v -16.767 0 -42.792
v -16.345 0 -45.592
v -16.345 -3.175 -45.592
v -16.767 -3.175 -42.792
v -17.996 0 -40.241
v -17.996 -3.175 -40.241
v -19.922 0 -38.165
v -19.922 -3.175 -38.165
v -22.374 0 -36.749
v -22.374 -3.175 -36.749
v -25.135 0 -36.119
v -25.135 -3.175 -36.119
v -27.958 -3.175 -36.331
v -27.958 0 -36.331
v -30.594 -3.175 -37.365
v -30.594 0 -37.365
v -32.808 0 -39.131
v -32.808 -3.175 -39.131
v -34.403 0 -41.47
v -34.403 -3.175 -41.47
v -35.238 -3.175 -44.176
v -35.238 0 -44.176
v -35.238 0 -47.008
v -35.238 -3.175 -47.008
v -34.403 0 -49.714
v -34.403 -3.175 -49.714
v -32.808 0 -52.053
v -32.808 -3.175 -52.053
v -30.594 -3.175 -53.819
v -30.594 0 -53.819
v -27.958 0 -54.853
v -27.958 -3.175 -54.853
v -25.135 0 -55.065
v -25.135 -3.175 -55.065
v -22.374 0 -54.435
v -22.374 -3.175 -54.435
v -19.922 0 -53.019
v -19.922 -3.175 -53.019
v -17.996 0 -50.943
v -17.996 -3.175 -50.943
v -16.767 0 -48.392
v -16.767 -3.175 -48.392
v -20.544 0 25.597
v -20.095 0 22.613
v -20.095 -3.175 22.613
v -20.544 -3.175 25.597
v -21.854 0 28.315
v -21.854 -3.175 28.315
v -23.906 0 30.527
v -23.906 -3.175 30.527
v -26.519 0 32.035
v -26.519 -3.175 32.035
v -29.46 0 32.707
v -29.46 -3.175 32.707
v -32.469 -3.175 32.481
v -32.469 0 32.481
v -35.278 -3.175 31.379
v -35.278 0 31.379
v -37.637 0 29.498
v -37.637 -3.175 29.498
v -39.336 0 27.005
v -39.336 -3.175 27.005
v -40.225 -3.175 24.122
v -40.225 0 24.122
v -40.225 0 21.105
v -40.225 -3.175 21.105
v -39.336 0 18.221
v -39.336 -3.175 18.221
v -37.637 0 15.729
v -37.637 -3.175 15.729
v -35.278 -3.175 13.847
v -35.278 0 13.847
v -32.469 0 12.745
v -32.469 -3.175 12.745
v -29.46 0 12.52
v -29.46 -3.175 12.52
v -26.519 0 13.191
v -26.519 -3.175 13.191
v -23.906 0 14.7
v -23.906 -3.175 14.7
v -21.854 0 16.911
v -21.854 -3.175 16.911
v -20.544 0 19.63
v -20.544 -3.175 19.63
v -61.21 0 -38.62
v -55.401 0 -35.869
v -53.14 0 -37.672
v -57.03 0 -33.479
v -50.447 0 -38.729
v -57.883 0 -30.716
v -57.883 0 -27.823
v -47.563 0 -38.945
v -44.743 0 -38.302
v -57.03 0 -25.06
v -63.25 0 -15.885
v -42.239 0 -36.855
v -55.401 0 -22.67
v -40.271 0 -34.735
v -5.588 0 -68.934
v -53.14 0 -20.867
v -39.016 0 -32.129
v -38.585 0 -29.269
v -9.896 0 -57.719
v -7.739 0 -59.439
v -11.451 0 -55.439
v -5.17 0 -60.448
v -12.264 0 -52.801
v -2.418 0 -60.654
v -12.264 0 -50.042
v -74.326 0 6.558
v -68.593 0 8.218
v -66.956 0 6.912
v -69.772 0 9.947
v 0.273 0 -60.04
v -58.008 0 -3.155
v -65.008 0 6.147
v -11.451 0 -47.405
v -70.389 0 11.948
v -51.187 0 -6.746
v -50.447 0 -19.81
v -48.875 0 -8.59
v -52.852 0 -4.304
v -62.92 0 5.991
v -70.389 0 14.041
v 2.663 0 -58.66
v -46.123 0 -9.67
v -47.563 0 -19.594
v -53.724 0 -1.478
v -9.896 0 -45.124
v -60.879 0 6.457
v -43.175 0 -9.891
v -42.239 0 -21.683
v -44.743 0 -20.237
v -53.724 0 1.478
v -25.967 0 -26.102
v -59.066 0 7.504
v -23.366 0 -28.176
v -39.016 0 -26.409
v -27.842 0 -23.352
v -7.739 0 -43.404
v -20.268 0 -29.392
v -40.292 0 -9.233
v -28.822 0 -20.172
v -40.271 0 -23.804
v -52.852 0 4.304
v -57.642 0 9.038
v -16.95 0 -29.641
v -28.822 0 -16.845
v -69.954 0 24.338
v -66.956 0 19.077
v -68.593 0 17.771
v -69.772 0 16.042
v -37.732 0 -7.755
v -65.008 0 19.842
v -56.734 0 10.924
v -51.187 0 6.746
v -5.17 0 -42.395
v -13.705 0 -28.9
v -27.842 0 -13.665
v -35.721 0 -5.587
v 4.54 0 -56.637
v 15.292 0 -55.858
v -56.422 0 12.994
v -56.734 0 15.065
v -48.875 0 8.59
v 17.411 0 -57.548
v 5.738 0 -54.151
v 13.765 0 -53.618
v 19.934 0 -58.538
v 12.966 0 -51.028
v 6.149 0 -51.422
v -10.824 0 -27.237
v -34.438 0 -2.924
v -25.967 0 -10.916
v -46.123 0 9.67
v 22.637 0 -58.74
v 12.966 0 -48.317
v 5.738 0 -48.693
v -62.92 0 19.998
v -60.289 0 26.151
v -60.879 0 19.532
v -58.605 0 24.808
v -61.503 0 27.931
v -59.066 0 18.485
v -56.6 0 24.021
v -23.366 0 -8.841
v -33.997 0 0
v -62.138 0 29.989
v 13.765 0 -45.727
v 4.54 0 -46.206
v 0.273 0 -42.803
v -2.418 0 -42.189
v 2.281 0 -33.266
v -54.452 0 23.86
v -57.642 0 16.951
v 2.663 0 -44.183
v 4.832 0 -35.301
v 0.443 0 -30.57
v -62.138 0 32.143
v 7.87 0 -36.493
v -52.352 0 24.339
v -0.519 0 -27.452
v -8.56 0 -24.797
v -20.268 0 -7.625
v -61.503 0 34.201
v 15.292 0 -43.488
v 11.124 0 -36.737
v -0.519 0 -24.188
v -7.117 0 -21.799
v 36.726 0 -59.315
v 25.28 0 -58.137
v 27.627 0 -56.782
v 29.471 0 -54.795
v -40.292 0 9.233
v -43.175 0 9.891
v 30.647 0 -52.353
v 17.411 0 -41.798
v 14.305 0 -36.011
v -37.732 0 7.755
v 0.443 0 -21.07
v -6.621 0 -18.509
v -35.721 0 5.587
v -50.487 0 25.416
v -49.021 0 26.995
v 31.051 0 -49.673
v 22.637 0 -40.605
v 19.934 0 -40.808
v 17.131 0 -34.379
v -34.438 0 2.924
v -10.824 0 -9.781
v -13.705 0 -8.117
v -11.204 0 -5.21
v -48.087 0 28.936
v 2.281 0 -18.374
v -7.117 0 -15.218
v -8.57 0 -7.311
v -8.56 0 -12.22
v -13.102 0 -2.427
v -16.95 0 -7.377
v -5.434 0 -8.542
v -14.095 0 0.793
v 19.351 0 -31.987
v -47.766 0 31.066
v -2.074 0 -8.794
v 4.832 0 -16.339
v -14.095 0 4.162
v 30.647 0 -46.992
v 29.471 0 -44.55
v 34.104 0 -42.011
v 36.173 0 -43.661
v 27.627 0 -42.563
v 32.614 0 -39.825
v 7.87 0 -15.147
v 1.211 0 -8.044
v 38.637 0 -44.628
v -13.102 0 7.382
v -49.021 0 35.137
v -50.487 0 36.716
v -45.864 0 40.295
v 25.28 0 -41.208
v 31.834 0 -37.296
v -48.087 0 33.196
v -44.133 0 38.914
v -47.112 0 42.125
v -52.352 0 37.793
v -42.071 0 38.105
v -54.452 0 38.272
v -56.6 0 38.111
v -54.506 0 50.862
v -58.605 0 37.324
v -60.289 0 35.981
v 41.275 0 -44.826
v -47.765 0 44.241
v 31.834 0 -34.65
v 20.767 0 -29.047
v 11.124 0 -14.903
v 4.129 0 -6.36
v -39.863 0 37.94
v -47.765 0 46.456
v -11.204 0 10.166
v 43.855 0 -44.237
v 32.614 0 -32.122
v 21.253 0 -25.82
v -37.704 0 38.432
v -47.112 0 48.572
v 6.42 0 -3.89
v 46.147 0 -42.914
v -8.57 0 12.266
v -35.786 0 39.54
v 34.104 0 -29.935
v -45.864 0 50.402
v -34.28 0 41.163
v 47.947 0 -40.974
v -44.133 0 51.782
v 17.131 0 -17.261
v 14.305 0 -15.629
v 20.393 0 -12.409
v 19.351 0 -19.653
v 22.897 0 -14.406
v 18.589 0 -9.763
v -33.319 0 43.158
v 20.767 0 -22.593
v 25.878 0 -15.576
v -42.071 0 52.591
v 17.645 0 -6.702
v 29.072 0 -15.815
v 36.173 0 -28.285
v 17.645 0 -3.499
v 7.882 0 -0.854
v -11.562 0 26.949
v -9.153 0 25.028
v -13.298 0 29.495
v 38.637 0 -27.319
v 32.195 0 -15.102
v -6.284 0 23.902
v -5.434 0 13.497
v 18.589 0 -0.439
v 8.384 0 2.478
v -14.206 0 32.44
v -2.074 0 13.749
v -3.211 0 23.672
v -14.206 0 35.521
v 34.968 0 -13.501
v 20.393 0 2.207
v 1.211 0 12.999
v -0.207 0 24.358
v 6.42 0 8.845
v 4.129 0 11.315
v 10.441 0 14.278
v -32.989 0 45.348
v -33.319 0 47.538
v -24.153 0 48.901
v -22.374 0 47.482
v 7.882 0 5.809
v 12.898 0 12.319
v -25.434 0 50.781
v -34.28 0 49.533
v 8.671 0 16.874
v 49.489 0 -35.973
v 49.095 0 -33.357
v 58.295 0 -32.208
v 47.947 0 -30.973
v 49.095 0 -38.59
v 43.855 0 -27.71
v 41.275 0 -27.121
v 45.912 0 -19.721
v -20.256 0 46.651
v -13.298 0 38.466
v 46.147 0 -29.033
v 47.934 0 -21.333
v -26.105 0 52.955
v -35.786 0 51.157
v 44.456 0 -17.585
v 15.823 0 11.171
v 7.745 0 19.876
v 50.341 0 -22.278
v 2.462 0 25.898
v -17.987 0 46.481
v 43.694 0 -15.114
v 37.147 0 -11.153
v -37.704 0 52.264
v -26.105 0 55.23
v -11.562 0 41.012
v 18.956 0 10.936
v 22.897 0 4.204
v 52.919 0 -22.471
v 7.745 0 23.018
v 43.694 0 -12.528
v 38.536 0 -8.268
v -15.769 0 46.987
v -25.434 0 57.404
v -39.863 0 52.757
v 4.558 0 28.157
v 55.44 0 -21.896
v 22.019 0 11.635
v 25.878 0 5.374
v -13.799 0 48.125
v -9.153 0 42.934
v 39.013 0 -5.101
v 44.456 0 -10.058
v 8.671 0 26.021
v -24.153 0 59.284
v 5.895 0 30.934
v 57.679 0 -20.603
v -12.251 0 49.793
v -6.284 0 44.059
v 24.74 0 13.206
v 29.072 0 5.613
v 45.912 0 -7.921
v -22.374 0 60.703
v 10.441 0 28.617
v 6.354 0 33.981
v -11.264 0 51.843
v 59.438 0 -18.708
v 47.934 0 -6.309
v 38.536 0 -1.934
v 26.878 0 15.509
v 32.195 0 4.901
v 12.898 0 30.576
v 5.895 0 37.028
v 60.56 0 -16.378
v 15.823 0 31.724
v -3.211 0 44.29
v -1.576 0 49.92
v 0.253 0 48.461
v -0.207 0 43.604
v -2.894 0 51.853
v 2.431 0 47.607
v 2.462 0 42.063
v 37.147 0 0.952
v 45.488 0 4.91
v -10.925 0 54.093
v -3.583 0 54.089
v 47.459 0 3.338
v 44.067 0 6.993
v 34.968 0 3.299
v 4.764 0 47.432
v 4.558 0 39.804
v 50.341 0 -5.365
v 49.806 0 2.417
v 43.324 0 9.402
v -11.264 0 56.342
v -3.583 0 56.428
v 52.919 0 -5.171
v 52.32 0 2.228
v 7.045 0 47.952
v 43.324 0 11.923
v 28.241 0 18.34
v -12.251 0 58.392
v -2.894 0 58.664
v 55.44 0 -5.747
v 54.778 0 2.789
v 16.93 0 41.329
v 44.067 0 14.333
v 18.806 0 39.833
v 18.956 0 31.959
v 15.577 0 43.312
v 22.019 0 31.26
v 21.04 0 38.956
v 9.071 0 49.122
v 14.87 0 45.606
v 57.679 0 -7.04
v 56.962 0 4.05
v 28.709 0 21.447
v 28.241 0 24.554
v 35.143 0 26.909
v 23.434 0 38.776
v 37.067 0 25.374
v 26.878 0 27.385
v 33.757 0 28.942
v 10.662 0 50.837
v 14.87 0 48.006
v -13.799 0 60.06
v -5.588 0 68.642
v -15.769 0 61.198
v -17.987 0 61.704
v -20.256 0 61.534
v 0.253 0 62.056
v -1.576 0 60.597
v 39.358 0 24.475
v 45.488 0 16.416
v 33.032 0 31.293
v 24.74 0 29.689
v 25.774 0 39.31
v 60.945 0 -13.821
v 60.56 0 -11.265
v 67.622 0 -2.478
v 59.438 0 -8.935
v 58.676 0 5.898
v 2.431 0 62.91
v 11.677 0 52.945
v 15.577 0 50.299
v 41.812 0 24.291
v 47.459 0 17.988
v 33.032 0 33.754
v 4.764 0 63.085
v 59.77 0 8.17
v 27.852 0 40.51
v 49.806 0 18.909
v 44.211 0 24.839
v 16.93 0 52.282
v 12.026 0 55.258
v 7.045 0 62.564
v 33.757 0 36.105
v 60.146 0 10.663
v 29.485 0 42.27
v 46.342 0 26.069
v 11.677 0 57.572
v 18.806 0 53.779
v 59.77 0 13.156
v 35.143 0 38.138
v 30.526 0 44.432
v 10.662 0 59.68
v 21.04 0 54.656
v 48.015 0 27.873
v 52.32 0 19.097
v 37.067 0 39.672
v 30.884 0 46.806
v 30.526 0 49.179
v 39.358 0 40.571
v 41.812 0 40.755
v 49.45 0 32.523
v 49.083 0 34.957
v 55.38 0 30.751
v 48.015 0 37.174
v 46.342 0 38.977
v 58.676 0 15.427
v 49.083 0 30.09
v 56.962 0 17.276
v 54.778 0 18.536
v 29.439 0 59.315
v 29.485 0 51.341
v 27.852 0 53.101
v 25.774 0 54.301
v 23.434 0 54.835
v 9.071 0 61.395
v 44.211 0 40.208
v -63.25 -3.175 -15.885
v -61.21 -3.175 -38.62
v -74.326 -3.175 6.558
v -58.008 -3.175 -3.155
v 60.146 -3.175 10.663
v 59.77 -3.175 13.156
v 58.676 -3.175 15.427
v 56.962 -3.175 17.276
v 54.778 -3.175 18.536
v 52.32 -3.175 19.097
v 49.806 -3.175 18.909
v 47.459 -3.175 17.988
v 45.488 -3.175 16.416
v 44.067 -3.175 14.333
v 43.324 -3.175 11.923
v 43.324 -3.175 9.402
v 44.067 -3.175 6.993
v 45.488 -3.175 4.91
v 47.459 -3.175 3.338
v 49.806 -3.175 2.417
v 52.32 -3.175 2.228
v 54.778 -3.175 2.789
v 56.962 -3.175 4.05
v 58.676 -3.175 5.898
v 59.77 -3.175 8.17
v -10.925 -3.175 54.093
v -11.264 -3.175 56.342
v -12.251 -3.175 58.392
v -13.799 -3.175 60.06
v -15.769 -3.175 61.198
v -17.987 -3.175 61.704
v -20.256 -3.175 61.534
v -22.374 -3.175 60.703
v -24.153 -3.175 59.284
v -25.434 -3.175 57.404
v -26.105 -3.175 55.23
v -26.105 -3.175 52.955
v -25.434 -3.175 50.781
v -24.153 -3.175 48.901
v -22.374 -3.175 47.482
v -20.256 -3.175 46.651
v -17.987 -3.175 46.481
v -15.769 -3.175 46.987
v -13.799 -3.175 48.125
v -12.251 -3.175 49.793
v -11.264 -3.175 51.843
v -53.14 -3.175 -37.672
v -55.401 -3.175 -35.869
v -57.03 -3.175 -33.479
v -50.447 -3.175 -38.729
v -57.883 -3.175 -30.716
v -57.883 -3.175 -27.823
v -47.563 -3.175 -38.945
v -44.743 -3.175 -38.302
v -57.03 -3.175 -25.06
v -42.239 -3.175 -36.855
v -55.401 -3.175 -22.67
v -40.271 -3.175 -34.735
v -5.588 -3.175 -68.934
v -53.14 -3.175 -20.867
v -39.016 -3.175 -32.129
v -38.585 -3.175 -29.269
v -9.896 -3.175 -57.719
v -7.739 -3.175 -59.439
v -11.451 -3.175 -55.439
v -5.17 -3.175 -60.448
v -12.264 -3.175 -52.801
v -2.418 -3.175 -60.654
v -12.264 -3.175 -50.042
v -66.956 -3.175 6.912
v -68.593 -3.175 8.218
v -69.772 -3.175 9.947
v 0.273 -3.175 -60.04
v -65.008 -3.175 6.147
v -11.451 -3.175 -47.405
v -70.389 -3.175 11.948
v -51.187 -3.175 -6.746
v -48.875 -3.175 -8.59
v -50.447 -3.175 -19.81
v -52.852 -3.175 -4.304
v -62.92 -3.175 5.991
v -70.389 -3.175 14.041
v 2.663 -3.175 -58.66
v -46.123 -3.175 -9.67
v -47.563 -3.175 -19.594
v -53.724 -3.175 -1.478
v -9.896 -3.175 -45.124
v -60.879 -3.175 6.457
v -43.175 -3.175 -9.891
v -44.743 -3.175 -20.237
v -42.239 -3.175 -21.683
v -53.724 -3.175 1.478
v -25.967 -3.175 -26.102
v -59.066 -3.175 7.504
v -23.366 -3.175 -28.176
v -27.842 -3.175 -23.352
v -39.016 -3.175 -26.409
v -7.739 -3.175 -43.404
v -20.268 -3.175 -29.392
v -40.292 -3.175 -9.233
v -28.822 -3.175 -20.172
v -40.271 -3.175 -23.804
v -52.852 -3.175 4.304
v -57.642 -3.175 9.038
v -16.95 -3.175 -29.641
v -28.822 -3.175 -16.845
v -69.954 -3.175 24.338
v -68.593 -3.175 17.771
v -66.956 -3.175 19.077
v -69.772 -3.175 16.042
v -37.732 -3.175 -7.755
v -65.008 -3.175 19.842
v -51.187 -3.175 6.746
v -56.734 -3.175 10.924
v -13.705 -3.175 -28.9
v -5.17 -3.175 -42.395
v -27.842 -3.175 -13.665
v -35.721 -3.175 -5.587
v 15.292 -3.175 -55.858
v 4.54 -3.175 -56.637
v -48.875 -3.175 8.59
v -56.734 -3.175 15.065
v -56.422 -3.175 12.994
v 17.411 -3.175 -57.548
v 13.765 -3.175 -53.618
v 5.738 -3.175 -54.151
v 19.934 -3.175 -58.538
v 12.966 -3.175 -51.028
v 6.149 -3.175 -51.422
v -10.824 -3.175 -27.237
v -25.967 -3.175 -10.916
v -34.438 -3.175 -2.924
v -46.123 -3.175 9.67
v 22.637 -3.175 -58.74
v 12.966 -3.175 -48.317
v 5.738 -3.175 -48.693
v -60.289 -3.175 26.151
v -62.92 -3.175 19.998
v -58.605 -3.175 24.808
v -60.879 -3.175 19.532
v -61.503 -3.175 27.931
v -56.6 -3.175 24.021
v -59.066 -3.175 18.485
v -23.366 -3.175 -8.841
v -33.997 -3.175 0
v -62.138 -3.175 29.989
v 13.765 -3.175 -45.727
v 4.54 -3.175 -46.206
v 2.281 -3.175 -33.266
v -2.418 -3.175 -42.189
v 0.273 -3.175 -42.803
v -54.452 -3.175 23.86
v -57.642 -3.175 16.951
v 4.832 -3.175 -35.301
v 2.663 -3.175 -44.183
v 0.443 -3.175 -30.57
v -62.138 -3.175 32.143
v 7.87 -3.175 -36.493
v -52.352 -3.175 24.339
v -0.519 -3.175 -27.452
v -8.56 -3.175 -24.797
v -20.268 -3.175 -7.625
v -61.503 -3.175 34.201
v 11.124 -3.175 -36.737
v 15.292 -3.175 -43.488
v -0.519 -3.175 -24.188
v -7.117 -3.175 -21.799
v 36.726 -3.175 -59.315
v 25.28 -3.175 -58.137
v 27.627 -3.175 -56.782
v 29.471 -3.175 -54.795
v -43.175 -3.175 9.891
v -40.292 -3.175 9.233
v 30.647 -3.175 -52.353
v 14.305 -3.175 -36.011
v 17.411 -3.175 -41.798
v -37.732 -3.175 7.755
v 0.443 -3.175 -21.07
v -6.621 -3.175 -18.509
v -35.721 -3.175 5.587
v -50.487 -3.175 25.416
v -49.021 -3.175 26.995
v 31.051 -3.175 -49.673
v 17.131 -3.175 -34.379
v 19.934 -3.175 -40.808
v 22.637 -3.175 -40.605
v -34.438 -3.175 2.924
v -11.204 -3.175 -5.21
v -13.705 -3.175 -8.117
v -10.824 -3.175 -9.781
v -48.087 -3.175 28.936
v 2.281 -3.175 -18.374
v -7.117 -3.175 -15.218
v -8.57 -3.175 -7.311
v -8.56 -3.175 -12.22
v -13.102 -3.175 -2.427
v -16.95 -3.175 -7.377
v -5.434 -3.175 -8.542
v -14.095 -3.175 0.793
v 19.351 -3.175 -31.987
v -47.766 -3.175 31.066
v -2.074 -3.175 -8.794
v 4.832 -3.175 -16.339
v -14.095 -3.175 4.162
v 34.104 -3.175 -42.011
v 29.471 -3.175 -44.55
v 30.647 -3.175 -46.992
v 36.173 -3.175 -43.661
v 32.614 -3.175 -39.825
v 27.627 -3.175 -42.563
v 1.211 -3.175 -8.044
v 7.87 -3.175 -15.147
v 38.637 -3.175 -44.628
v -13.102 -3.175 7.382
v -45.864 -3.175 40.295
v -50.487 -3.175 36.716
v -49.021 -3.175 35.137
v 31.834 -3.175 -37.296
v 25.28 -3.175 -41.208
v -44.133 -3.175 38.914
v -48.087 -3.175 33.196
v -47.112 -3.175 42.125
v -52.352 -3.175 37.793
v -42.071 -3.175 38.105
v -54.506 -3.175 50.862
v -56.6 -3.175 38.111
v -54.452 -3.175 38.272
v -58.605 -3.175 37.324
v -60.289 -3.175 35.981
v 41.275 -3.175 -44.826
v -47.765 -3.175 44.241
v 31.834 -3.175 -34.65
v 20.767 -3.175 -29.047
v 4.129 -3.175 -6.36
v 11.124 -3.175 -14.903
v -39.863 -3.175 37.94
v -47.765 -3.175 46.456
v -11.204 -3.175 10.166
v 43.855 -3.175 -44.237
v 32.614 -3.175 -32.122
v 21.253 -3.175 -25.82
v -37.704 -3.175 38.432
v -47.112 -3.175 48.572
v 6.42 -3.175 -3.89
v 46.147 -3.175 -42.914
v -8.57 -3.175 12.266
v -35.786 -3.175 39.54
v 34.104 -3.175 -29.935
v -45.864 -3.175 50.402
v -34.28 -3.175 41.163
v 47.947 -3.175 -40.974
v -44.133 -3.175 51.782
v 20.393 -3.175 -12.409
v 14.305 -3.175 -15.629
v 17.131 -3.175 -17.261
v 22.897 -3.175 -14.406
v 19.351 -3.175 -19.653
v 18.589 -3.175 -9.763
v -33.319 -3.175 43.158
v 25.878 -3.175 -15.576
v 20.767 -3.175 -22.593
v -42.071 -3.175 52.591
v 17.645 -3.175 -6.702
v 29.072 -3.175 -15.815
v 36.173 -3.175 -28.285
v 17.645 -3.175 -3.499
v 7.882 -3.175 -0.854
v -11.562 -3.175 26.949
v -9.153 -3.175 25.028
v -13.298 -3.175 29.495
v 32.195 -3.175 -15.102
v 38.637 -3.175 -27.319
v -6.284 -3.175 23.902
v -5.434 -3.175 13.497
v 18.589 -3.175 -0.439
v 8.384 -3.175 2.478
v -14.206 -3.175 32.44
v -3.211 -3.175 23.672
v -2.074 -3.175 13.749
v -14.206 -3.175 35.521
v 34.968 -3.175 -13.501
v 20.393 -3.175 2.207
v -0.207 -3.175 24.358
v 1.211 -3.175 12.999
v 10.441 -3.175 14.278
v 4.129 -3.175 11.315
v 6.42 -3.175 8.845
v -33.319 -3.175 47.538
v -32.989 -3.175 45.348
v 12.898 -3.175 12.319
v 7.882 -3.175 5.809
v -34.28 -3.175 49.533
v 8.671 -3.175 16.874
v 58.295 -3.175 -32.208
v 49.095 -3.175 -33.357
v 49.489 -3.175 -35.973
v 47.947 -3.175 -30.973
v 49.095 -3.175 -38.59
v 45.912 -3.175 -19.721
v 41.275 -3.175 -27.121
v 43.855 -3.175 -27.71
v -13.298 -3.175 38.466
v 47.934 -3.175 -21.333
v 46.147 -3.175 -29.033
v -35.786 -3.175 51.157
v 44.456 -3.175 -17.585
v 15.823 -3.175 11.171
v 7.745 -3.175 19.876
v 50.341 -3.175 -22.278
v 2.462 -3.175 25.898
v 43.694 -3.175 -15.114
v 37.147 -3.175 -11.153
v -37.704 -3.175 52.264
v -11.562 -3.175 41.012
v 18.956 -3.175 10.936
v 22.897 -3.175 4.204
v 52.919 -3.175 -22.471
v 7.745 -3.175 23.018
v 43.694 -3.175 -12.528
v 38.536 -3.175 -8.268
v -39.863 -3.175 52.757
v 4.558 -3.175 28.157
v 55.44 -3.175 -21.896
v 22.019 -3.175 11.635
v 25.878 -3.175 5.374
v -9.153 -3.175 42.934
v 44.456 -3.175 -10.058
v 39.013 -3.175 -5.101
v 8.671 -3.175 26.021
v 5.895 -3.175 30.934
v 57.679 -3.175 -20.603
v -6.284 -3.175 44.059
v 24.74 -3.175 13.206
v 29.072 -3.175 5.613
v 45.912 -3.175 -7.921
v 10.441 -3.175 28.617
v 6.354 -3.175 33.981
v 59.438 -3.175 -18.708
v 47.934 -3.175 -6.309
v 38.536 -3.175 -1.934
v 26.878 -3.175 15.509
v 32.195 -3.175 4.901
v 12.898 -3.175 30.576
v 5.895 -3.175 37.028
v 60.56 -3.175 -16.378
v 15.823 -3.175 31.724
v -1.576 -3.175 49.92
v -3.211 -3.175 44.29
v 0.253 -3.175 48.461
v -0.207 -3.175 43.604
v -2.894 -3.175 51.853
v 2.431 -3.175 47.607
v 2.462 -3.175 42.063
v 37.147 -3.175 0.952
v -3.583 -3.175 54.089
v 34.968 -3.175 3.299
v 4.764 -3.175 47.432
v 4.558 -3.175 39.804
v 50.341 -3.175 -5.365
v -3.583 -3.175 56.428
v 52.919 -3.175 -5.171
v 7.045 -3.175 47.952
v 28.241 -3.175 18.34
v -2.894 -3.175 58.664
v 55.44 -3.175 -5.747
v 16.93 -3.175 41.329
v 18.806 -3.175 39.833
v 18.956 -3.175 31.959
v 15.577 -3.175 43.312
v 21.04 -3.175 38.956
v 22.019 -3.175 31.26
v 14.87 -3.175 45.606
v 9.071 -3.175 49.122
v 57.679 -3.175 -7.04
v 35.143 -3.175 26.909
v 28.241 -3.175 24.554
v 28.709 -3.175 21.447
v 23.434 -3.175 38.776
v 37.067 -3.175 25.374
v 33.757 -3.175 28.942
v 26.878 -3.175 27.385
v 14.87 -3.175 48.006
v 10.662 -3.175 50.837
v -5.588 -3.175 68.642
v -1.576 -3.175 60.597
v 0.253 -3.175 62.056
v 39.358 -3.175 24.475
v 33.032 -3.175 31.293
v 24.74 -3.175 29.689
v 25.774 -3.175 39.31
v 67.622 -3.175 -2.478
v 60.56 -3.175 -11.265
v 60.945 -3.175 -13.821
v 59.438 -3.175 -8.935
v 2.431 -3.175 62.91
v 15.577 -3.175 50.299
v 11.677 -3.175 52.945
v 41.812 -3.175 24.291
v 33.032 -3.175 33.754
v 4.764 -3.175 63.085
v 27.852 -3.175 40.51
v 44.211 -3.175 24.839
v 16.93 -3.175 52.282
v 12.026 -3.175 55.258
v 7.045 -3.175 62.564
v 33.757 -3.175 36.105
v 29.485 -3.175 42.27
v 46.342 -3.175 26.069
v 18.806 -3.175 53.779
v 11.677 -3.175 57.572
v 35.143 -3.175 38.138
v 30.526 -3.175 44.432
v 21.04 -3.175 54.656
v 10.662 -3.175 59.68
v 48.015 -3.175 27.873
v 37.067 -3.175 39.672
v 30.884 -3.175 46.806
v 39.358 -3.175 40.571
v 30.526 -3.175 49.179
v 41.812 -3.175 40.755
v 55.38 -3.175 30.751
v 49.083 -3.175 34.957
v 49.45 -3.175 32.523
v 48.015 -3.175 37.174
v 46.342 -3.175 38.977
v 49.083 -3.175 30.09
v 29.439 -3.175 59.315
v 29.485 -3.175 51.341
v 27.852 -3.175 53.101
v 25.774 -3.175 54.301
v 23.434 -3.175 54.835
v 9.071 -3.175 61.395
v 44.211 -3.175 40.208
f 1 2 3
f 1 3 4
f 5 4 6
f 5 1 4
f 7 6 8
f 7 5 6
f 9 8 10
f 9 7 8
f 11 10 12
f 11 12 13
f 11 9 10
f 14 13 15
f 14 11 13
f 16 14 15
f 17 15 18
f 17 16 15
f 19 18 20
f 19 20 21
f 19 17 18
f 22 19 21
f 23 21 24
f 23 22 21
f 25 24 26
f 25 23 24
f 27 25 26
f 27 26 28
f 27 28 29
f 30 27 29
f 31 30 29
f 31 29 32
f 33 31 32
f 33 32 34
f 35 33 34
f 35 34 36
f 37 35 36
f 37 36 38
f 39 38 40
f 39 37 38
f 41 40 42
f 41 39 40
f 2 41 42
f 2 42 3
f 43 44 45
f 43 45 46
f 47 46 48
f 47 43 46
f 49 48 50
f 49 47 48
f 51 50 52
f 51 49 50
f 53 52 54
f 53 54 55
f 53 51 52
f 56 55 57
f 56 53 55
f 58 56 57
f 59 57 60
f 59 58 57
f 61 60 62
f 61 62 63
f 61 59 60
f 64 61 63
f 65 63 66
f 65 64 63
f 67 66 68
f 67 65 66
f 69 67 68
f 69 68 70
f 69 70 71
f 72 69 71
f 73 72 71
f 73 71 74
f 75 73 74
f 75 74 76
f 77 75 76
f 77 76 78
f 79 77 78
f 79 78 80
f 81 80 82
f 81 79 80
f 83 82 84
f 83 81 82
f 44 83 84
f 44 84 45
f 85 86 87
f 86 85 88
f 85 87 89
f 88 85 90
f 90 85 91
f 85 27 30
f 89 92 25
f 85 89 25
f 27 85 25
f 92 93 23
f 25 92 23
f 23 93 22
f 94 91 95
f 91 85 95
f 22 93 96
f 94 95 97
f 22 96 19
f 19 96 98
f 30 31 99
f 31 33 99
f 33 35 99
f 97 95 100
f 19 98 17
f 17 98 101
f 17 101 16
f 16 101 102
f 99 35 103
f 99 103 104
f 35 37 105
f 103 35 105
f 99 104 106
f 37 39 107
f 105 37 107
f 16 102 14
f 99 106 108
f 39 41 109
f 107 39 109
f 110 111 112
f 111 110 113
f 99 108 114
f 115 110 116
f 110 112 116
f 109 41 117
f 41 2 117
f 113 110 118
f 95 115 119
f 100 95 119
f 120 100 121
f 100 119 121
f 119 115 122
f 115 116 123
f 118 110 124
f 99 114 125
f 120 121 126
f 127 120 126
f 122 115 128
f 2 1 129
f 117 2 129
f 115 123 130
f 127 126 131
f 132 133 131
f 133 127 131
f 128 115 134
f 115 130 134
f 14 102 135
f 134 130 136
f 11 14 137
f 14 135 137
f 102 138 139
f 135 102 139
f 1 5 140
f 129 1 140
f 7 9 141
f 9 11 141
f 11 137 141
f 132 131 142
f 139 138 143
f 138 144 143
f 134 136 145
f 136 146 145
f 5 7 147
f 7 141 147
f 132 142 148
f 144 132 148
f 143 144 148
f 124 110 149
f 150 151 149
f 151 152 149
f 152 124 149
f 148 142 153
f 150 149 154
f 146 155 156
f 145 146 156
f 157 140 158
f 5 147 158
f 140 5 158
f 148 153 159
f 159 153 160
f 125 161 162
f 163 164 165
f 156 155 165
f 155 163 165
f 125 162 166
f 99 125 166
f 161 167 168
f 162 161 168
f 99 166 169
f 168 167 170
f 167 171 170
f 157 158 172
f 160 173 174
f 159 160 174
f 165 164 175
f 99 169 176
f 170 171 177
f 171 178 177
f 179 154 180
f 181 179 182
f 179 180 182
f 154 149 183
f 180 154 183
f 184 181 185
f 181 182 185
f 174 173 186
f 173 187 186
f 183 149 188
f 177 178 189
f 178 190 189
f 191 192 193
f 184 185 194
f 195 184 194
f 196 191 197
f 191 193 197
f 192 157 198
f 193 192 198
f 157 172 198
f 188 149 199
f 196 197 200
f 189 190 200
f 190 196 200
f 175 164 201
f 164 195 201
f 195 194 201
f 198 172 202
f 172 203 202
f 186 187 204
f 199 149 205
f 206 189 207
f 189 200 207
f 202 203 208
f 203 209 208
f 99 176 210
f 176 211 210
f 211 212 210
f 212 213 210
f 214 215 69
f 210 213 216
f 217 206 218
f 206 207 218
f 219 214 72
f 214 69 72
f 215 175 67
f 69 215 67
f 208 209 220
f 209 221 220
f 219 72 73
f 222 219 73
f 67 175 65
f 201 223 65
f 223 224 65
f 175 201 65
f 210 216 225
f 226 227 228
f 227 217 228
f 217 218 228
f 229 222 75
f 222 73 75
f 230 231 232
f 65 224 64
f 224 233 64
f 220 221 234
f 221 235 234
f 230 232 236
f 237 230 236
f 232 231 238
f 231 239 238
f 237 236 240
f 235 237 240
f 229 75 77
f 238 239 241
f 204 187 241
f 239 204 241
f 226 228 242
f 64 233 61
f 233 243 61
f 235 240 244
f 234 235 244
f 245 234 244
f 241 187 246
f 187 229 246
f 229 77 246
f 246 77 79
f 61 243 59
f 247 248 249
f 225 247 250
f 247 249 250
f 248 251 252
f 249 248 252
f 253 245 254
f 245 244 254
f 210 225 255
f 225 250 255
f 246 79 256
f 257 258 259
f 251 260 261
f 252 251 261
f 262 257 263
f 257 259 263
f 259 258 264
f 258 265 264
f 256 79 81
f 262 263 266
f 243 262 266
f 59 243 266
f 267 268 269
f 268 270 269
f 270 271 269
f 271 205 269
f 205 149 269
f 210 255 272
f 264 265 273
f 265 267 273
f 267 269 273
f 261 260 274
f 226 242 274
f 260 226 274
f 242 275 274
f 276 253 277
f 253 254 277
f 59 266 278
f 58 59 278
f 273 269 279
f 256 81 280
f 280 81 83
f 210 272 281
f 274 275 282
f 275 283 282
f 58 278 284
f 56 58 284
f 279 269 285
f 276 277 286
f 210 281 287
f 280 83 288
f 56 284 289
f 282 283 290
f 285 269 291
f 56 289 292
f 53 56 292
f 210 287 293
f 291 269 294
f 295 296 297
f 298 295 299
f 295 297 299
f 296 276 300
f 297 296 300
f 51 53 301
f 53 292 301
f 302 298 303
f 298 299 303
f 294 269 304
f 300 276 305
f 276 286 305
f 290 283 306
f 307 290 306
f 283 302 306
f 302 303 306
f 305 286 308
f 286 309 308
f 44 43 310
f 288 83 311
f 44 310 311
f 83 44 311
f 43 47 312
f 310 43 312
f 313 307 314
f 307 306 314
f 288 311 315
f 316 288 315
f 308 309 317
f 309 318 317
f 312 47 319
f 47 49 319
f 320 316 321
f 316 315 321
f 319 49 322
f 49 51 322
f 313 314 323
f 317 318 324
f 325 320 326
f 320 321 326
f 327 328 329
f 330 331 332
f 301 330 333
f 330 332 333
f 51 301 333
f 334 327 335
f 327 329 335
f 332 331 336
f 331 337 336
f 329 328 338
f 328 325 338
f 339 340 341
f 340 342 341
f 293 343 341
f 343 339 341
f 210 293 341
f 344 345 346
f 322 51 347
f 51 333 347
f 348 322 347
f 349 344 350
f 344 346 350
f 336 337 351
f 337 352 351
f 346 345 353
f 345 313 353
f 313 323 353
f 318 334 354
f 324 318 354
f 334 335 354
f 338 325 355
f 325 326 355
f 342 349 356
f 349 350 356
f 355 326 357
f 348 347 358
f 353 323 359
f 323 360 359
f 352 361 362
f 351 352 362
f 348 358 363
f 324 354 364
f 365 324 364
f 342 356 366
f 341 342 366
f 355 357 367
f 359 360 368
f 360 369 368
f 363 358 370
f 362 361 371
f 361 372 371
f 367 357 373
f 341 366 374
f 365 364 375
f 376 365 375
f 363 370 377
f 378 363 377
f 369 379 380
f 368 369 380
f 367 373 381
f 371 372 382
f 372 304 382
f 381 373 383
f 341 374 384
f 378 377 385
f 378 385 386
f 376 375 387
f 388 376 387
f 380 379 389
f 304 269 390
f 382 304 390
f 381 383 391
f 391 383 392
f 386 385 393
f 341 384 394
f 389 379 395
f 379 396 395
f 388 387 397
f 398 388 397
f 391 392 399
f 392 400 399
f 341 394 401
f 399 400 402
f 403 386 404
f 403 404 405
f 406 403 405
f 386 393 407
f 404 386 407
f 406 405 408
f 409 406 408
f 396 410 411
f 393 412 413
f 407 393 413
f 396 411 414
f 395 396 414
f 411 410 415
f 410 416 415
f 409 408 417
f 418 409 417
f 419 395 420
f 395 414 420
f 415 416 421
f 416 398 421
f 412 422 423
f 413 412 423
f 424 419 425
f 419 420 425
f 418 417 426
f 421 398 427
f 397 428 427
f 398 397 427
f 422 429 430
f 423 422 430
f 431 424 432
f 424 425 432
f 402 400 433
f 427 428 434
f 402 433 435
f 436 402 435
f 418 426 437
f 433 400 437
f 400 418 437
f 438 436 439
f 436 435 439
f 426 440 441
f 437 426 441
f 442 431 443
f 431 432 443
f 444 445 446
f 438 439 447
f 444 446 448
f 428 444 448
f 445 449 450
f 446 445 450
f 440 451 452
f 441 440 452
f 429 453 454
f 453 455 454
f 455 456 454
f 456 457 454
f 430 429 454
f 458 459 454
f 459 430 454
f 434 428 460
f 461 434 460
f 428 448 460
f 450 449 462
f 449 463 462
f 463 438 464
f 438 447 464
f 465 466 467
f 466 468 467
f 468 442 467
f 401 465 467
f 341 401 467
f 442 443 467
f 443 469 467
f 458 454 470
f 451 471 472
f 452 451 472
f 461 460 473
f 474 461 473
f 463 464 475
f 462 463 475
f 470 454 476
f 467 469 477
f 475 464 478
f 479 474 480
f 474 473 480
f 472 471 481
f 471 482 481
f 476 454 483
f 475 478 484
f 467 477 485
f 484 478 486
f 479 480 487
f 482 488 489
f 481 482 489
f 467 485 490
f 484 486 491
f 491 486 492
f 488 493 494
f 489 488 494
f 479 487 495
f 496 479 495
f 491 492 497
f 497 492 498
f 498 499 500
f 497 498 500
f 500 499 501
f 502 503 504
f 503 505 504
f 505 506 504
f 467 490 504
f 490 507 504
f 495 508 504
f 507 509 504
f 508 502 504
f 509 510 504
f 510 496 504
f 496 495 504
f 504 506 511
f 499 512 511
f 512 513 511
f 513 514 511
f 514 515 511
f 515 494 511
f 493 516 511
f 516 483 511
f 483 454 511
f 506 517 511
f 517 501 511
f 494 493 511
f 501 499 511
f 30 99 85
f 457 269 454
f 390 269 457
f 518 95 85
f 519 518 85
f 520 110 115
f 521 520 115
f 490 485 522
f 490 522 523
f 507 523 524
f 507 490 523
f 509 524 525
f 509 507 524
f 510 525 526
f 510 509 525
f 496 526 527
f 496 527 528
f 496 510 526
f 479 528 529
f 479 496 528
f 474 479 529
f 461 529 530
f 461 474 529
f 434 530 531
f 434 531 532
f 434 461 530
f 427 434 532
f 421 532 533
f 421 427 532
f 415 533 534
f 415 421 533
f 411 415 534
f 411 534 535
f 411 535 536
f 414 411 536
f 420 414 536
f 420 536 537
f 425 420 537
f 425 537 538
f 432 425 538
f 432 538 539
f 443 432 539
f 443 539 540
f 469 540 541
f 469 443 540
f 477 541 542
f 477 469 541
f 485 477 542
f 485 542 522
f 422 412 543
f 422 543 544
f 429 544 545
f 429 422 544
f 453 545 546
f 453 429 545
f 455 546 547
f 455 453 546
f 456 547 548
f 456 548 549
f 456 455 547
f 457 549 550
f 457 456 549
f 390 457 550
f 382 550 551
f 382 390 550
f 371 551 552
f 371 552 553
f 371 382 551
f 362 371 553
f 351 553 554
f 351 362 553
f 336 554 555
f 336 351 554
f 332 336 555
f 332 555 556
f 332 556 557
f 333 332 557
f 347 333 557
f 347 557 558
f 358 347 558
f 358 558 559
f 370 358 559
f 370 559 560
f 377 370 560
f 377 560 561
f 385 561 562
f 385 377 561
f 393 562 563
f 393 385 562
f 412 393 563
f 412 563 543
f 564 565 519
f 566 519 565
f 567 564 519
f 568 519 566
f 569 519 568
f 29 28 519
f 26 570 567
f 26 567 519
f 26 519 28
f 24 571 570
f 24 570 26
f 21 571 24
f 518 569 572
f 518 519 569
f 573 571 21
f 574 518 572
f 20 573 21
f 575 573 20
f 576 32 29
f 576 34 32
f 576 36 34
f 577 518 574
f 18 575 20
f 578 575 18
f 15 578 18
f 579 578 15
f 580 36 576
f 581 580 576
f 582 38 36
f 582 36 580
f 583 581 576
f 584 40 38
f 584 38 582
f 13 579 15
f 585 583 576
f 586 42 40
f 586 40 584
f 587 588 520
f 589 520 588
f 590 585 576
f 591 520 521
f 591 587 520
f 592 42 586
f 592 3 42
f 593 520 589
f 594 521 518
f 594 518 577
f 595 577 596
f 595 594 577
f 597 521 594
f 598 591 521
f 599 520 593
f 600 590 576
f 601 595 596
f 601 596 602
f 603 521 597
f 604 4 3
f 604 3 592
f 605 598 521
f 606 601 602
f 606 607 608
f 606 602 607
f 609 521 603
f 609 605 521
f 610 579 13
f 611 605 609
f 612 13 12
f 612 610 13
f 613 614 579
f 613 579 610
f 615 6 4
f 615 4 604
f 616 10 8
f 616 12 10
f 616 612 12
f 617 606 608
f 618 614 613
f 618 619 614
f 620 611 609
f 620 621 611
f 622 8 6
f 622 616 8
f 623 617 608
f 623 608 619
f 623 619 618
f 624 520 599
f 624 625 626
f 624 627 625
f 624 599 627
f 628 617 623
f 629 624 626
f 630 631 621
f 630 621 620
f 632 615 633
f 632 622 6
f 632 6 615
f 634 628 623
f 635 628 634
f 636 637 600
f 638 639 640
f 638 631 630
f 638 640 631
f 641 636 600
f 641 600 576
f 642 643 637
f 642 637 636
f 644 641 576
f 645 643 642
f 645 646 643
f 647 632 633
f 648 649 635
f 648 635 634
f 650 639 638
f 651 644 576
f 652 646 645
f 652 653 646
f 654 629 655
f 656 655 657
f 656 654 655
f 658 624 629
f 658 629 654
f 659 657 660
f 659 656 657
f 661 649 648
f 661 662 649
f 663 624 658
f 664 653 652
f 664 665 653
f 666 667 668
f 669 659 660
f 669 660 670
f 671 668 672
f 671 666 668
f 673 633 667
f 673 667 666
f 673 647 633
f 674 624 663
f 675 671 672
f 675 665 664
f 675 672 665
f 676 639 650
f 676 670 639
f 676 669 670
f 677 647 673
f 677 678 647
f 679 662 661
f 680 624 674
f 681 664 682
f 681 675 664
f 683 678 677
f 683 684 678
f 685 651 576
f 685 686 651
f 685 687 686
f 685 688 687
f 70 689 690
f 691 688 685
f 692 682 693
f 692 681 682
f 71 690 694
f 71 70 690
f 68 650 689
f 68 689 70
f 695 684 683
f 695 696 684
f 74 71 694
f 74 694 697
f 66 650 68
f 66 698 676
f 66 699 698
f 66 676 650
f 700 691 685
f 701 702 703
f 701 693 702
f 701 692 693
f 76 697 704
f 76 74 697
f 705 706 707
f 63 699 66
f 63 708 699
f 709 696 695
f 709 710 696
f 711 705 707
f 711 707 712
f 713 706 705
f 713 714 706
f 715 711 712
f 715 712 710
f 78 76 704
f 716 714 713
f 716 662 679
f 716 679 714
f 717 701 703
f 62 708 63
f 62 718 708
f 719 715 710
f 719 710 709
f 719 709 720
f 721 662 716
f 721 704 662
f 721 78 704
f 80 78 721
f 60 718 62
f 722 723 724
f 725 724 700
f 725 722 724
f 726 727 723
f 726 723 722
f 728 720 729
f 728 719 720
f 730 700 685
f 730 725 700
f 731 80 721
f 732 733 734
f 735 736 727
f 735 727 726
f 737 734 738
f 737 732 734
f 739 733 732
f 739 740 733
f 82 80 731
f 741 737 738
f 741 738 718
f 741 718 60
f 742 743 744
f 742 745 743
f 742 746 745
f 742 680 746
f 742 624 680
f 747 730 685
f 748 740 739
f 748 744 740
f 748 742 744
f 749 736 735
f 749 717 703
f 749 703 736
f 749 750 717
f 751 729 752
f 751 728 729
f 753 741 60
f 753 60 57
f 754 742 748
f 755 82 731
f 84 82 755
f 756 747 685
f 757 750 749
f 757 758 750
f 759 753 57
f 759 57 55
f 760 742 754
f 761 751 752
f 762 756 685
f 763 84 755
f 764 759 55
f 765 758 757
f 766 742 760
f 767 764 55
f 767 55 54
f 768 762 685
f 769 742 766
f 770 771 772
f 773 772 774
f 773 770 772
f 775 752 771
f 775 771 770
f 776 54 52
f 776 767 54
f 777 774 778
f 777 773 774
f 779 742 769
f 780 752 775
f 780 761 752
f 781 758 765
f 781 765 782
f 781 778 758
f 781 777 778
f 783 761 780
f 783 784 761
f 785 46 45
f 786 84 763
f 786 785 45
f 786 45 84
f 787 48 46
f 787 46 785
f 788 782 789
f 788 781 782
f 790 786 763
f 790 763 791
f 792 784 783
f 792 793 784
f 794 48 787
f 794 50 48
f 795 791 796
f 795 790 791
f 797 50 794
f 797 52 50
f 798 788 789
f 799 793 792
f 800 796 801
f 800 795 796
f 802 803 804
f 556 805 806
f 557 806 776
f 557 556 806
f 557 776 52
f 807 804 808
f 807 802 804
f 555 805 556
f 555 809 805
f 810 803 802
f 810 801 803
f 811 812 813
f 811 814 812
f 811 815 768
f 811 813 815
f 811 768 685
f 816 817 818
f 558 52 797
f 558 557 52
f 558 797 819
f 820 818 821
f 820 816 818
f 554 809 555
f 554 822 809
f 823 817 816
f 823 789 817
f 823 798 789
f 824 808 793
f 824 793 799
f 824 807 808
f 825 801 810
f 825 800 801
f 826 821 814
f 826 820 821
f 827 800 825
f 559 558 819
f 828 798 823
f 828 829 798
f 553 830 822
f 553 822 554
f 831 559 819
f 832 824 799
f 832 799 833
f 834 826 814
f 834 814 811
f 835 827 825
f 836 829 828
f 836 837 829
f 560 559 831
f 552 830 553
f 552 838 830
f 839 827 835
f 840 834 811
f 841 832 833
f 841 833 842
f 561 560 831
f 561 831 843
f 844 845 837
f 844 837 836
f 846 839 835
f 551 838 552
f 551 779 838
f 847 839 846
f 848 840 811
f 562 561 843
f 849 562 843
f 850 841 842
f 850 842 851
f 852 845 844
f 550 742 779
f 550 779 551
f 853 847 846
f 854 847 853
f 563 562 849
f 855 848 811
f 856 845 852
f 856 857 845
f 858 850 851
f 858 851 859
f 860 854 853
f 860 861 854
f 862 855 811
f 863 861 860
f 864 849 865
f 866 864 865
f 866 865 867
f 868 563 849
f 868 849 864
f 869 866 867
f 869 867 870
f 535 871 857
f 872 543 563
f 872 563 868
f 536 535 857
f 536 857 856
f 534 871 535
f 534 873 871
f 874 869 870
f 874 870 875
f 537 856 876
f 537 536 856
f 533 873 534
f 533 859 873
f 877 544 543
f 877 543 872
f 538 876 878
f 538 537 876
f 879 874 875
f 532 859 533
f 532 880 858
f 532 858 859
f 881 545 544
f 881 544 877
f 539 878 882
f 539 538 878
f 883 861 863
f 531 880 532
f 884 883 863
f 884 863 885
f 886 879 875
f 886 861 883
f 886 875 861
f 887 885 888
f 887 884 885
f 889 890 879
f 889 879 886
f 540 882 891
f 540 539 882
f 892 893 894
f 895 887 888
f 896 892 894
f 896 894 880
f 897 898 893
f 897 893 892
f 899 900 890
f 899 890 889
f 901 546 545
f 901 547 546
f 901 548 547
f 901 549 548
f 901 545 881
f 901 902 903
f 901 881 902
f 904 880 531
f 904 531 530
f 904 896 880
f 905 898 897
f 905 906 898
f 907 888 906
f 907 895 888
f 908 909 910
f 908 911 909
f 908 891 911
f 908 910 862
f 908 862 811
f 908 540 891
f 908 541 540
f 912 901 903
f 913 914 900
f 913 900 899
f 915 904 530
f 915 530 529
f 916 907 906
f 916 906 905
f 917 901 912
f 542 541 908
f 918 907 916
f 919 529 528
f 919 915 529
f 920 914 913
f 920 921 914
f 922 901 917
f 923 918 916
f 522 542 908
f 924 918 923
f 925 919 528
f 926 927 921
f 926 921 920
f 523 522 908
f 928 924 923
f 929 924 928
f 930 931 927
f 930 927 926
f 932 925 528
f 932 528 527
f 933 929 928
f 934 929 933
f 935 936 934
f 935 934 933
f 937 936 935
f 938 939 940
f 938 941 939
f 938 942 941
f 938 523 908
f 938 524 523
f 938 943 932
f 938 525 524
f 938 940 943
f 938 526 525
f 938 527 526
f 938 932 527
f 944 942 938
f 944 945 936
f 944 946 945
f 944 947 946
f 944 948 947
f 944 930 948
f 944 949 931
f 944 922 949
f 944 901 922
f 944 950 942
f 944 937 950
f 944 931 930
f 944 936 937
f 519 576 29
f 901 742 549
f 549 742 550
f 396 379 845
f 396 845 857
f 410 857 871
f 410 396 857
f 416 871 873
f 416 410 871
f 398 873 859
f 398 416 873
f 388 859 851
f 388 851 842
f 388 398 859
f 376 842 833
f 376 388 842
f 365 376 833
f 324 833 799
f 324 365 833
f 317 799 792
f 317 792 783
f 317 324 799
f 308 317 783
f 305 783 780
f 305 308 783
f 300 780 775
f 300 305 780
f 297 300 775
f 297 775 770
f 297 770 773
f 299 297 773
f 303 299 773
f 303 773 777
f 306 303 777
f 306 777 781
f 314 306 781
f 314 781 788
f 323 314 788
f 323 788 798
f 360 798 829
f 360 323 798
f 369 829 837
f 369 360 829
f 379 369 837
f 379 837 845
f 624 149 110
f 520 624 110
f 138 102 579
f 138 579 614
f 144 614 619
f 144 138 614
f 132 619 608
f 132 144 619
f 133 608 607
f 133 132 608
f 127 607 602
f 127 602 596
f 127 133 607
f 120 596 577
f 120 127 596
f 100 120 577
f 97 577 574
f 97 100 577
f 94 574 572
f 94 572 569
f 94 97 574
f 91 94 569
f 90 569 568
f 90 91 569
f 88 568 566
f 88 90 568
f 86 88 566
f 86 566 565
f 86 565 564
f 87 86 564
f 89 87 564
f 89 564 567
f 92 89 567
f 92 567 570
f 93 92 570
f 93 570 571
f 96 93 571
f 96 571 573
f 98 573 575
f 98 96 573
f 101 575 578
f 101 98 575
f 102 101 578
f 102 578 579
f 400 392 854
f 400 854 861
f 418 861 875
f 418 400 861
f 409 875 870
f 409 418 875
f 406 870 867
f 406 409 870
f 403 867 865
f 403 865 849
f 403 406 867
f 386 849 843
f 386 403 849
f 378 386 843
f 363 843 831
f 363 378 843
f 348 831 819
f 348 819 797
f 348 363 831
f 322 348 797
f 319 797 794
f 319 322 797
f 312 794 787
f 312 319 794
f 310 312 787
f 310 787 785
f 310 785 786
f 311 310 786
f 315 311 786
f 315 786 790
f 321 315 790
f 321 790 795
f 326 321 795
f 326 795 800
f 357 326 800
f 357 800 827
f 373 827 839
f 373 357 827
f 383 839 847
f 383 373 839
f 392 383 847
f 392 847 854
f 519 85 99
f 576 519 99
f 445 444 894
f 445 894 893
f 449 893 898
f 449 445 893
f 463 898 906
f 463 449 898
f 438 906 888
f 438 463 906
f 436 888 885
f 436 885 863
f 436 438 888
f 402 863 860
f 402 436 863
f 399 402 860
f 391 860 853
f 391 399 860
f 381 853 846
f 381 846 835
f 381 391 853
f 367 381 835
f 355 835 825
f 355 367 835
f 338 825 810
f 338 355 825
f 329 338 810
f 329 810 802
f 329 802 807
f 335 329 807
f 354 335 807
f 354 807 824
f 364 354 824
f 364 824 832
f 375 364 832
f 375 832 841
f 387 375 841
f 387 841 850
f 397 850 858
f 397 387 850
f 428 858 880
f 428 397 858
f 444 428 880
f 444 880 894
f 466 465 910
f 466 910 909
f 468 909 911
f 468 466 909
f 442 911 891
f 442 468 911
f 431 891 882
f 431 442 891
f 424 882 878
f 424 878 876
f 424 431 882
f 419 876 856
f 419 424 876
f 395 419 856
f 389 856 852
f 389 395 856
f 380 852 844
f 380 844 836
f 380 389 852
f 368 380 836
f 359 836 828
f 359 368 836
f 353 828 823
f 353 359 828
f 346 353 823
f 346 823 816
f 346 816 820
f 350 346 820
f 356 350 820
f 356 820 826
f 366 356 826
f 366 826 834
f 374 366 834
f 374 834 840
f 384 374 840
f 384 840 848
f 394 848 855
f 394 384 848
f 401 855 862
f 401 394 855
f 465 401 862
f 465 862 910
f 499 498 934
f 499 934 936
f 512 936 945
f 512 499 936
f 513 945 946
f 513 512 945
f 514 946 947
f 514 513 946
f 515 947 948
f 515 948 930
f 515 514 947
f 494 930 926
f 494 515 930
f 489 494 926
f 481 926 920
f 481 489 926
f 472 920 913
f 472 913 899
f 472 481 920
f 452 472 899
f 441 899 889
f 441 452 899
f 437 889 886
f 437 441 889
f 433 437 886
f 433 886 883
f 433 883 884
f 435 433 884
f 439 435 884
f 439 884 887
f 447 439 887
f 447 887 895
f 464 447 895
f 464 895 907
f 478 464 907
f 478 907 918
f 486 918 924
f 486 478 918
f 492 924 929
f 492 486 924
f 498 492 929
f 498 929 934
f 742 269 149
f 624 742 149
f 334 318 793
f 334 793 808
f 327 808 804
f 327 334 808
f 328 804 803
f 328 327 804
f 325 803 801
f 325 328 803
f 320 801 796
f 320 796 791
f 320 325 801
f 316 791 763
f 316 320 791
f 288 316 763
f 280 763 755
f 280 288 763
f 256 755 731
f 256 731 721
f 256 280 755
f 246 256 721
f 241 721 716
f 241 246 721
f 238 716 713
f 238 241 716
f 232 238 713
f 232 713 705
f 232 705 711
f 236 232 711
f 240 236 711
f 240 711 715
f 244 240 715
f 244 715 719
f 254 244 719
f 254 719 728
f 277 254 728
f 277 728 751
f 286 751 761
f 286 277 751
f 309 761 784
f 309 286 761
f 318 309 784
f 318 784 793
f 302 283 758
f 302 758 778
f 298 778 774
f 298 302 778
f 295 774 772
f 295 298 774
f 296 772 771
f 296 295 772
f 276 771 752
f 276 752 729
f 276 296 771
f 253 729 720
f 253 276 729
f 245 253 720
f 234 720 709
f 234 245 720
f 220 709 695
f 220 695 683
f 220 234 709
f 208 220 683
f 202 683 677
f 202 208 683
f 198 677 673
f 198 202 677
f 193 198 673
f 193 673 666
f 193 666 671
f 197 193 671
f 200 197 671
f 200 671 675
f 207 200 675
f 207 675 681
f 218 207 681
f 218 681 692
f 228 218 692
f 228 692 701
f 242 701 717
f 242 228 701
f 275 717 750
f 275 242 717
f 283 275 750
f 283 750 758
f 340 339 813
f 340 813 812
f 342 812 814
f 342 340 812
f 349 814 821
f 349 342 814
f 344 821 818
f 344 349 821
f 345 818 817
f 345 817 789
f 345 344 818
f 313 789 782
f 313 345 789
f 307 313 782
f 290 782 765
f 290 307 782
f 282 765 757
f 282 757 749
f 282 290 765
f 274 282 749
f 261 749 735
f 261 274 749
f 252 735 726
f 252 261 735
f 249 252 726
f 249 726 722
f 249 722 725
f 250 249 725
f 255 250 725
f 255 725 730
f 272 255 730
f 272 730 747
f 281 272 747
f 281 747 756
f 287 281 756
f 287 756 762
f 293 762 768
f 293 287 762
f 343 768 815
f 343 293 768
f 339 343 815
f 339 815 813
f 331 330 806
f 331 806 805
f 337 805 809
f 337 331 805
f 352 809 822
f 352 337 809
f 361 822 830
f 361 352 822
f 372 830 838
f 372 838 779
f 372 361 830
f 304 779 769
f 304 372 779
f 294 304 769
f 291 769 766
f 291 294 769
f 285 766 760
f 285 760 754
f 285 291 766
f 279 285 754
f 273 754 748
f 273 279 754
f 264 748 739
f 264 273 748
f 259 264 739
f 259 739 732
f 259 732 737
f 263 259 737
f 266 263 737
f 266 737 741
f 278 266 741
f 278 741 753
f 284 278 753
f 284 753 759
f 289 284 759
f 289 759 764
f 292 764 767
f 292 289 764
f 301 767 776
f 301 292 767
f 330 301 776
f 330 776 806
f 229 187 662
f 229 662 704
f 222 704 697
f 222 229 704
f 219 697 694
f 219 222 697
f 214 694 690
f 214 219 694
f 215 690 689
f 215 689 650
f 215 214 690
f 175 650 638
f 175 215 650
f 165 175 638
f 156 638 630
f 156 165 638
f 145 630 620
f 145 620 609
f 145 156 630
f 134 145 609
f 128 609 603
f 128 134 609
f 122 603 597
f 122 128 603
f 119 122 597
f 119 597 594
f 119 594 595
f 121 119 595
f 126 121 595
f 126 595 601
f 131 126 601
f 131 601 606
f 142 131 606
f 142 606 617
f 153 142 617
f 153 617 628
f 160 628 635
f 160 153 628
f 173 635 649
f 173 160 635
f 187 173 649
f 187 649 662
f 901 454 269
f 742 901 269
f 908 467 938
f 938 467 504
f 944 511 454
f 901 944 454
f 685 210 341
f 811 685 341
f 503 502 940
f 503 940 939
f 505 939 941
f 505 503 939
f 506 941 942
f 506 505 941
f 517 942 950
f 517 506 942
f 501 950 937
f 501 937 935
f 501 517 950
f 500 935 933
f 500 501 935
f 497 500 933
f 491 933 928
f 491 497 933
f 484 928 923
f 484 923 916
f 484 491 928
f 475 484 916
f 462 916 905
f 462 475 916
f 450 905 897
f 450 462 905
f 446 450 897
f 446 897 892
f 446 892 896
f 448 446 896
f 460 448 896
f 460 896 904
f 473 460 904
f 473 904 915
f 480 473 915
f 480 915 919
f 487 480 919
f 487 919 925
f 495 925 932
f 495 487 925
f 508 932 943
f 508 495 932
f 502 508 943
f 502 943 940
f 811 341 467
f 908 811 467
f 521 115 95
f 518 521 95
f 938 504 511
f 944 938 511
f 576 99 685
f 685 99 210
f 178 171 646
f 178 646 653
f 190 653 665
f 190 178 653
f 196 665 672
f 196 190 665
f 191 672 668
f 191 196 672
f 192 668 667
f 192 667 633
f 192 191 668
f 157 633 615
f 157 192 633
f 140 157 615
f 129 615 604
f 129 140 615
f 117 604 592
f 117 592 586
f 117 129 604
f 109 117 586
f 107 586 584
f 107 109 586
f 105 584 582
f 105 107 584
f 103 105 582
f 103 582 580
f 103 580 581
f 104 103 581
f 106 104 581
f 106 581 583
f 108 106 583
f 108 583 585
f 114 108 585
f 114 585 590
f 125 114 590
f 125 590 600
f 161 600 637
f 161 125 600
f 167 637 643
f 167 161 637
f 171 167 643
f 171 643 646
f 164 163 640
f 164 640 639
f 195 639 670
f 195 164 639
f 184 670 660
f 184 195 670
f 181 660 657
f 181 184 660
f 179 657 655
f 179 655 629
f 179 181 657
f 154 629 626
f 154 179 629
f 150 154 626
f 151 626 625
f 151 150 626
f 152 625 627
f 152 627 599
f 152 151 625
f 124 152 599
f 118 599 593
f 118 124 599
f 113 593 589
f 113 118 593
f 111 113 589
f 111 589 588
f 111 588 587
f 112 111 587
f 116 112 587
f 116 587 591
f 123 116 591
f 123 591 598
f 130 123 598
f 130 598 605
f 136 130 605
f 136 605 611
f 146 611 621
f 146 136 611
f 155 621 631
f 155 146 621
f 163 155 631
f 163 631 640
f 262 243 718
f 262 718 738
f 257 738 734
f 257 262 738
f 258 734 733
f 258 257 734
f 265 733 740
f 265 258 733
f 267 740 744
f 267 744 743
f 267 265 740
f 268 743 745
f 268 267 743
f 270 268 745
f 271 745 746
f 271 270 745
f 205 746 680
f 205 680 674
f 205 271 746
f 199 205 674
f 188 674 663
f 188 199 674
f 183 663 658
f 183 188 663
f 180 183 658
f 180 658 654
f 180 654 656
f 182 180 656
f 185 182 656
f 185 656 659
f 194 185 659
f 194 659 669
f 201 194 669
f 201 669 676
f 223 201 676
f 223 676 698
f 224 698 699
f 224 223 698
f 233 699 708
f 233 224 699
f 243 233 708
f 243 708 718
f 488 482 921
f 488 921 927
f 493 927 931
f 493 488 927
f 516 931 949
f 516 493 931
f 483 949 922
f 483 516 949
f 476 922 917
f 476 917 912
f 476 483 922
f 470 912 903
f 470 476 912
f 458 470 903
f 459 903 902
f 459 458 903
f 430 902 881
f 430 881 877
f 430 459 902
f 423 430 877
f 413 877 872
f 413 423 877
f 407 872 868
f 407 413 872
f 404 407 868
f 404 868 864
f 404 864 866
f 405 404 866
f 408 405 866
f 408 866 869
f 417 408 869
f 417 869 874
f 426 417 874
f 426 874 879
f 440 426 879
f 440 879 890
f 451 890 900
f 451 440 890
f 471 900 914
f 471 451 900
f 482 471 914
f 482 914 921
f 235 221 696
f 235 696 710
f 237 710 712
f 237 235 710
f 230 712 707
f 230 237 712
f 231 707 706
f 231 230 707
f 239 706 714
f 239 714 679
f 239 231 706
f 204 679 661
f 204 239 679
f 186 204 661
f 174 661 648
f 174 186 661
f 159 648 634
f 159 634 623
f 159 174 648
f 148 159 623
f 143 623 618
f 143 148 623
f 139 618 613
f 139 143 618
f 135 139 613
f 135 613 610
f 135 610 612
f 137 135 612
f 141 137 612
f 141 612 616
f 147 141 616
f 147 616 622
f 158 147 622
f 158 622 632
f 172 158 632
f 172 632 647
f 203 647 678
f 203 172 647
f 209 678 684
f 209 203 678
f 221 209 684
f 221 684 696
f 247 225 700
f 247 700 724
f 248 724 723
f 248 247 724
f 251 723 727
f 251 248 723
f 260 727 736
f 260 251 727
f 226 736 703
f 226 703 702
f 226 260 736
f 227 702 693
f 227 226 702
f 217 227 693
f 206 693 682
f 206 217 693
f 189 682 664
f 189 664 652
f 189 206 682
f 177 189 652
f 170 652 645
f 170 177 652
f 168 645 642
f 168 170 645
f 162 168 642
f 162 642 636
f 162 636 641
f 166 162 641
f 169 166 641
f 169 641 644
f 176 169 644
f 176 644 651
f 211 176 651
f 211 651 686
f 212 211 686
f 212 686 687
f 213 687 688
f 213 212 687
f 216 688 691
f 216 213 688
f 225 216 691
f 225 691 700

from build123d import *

# Parameters (mm, degrees)
F0_R     = 9.4996
F0_R_2   = 9.7028
F0_R_3   = 11.1633
F0_R_4   = 9.2583
F0_R_5   = 9.0932
F0_R_6   = 8.8773
F0_R_7   = 10.9474
F0_R_8   = 10.7442
F0_R_9   = 8.6741
F0_R_10  = 7.0231
F0_R_11  = 9.9187
F0_R_12  = 7.2263
F0_R_13  = 10.1219
F0_R_14  = 10.3378
F0_R_15  = 7.4295
F0_R_16  = 7.6327
F0_R_17  = 11.303
F0_R_18  = 10.541
F0_R_19  = 8.4582
F0_R_20  = 8.255
F0_R_21  = 8.0518
F0_R_22  = 7.8486
F1_DEPTH = 3.175


with BuildPart() as f1:
    # F0 (on Front) → F1 (new body)
    with BuildSketch(Plane.XZ):
        Polygon((-74.326232, 6.558197), (-58.00814, -3.154771), (-63.250169, -15.885411), (-61.209839, -38.620494), (-5.588048, -68.933934), (36.725905, -59.315246), (58.295086, -32.208033), (67.622297, -2.477541), (55.380326, 30.750657), (29.439015, 59.315246), (-5.588048, 68.64246), (-54.505903, 50.862461), (-69.954097, 24.338197), align=None)
        with Locations((-25.844501, -45.592066)):
            Circle(F0_R, mode=Mode.SUBTRACT)
        with Locations((-48.288107, -29.26944)):
            Circle(F0_R_2, mode=Mode.SUBTRACT)
        with Locations((-17.783852, -18.508689)):
            Circle(F0_R_3, mode=Mode.SUBTRACT)
        with Locations((-3.109419, -51.421572)):
            Circle(F0_R_4, mode=Mode.SUBTRACT)
        with Locations((21.957465, -49.672719)):
            Circle(F0_R_5, mode=Mode.SUBTRACT)
        with Locations((40.611893, -35.973374)):
            Circle(F0_R_6, mode=Mode.SUBTRACT)
        with Locations((10.305857, -25.8201)):
            Circle(F0_R_7, mode=Mode.SUBTRACT)
        with Locations((28.269259, -5.10082)):
            Circle(F0_R_8, mode=Mode.SUBTRACT)
        with Locations((52.270912, -13.821245)):
            Circle(F0_R_9, mode=Mode.SUBTRACT)
        with Locations((-63.44483, 12.994493)):
            Circle(F0_R_10, mode=Mode.SUBTRACT)
        with Locations((-43.915976, 0)):
            Circle(F0_R_11, mode=Mode.SUBTRACT)
        with Locations((-54.992042, 31.065969)):
            Circle(F0_R_12, mode=Mode.SUBTRACT)
        with Locations((-30.216632, 22.613181)):
            Circle(F0_R_13, mode=Mode.SUBTRACT)
        with Locations((-3.983845, 33.980723)):
            Circle(F0_R_14, mode=Mode.SUBTRACT)
        with Locations((-40.418271, 45.348264)):
            Circle(F0_R_15, mode=Mode.SUBTRACT)
        with Locations((-18.557616, 54.092523)):
            Circle(F0_R_16, mode=Mode.SUBTRACT)
        with Locations((-2.918608, 2.477541)):
            Circle(F0_R_17, mode=Mode.SUBTRACT)
        with Locations((18.168284, 21.44728)):
            Circle(F0_R_18, mode=Mode.SUBTRACT)
        with Locations((51.68796, 10.66269)):
            Circle(F0_R_19, mode=Mode.SUBTRACT)
        with Locations((41.194841, 32.523345)):
            Circle(F0_R_20, mode=Mode.SUBTRACT)
        with Locations((22.831891, 46.805643)):
            Circle(F0_R_21, mode=Mode.SUBTRACT)
        with Locations((4.177465, 55.258427)):
            Circle(F0_R_22, mode=Mode.SUBTRACT)
    extrude(amount=F1_DEPTH)


solid = f1.part
